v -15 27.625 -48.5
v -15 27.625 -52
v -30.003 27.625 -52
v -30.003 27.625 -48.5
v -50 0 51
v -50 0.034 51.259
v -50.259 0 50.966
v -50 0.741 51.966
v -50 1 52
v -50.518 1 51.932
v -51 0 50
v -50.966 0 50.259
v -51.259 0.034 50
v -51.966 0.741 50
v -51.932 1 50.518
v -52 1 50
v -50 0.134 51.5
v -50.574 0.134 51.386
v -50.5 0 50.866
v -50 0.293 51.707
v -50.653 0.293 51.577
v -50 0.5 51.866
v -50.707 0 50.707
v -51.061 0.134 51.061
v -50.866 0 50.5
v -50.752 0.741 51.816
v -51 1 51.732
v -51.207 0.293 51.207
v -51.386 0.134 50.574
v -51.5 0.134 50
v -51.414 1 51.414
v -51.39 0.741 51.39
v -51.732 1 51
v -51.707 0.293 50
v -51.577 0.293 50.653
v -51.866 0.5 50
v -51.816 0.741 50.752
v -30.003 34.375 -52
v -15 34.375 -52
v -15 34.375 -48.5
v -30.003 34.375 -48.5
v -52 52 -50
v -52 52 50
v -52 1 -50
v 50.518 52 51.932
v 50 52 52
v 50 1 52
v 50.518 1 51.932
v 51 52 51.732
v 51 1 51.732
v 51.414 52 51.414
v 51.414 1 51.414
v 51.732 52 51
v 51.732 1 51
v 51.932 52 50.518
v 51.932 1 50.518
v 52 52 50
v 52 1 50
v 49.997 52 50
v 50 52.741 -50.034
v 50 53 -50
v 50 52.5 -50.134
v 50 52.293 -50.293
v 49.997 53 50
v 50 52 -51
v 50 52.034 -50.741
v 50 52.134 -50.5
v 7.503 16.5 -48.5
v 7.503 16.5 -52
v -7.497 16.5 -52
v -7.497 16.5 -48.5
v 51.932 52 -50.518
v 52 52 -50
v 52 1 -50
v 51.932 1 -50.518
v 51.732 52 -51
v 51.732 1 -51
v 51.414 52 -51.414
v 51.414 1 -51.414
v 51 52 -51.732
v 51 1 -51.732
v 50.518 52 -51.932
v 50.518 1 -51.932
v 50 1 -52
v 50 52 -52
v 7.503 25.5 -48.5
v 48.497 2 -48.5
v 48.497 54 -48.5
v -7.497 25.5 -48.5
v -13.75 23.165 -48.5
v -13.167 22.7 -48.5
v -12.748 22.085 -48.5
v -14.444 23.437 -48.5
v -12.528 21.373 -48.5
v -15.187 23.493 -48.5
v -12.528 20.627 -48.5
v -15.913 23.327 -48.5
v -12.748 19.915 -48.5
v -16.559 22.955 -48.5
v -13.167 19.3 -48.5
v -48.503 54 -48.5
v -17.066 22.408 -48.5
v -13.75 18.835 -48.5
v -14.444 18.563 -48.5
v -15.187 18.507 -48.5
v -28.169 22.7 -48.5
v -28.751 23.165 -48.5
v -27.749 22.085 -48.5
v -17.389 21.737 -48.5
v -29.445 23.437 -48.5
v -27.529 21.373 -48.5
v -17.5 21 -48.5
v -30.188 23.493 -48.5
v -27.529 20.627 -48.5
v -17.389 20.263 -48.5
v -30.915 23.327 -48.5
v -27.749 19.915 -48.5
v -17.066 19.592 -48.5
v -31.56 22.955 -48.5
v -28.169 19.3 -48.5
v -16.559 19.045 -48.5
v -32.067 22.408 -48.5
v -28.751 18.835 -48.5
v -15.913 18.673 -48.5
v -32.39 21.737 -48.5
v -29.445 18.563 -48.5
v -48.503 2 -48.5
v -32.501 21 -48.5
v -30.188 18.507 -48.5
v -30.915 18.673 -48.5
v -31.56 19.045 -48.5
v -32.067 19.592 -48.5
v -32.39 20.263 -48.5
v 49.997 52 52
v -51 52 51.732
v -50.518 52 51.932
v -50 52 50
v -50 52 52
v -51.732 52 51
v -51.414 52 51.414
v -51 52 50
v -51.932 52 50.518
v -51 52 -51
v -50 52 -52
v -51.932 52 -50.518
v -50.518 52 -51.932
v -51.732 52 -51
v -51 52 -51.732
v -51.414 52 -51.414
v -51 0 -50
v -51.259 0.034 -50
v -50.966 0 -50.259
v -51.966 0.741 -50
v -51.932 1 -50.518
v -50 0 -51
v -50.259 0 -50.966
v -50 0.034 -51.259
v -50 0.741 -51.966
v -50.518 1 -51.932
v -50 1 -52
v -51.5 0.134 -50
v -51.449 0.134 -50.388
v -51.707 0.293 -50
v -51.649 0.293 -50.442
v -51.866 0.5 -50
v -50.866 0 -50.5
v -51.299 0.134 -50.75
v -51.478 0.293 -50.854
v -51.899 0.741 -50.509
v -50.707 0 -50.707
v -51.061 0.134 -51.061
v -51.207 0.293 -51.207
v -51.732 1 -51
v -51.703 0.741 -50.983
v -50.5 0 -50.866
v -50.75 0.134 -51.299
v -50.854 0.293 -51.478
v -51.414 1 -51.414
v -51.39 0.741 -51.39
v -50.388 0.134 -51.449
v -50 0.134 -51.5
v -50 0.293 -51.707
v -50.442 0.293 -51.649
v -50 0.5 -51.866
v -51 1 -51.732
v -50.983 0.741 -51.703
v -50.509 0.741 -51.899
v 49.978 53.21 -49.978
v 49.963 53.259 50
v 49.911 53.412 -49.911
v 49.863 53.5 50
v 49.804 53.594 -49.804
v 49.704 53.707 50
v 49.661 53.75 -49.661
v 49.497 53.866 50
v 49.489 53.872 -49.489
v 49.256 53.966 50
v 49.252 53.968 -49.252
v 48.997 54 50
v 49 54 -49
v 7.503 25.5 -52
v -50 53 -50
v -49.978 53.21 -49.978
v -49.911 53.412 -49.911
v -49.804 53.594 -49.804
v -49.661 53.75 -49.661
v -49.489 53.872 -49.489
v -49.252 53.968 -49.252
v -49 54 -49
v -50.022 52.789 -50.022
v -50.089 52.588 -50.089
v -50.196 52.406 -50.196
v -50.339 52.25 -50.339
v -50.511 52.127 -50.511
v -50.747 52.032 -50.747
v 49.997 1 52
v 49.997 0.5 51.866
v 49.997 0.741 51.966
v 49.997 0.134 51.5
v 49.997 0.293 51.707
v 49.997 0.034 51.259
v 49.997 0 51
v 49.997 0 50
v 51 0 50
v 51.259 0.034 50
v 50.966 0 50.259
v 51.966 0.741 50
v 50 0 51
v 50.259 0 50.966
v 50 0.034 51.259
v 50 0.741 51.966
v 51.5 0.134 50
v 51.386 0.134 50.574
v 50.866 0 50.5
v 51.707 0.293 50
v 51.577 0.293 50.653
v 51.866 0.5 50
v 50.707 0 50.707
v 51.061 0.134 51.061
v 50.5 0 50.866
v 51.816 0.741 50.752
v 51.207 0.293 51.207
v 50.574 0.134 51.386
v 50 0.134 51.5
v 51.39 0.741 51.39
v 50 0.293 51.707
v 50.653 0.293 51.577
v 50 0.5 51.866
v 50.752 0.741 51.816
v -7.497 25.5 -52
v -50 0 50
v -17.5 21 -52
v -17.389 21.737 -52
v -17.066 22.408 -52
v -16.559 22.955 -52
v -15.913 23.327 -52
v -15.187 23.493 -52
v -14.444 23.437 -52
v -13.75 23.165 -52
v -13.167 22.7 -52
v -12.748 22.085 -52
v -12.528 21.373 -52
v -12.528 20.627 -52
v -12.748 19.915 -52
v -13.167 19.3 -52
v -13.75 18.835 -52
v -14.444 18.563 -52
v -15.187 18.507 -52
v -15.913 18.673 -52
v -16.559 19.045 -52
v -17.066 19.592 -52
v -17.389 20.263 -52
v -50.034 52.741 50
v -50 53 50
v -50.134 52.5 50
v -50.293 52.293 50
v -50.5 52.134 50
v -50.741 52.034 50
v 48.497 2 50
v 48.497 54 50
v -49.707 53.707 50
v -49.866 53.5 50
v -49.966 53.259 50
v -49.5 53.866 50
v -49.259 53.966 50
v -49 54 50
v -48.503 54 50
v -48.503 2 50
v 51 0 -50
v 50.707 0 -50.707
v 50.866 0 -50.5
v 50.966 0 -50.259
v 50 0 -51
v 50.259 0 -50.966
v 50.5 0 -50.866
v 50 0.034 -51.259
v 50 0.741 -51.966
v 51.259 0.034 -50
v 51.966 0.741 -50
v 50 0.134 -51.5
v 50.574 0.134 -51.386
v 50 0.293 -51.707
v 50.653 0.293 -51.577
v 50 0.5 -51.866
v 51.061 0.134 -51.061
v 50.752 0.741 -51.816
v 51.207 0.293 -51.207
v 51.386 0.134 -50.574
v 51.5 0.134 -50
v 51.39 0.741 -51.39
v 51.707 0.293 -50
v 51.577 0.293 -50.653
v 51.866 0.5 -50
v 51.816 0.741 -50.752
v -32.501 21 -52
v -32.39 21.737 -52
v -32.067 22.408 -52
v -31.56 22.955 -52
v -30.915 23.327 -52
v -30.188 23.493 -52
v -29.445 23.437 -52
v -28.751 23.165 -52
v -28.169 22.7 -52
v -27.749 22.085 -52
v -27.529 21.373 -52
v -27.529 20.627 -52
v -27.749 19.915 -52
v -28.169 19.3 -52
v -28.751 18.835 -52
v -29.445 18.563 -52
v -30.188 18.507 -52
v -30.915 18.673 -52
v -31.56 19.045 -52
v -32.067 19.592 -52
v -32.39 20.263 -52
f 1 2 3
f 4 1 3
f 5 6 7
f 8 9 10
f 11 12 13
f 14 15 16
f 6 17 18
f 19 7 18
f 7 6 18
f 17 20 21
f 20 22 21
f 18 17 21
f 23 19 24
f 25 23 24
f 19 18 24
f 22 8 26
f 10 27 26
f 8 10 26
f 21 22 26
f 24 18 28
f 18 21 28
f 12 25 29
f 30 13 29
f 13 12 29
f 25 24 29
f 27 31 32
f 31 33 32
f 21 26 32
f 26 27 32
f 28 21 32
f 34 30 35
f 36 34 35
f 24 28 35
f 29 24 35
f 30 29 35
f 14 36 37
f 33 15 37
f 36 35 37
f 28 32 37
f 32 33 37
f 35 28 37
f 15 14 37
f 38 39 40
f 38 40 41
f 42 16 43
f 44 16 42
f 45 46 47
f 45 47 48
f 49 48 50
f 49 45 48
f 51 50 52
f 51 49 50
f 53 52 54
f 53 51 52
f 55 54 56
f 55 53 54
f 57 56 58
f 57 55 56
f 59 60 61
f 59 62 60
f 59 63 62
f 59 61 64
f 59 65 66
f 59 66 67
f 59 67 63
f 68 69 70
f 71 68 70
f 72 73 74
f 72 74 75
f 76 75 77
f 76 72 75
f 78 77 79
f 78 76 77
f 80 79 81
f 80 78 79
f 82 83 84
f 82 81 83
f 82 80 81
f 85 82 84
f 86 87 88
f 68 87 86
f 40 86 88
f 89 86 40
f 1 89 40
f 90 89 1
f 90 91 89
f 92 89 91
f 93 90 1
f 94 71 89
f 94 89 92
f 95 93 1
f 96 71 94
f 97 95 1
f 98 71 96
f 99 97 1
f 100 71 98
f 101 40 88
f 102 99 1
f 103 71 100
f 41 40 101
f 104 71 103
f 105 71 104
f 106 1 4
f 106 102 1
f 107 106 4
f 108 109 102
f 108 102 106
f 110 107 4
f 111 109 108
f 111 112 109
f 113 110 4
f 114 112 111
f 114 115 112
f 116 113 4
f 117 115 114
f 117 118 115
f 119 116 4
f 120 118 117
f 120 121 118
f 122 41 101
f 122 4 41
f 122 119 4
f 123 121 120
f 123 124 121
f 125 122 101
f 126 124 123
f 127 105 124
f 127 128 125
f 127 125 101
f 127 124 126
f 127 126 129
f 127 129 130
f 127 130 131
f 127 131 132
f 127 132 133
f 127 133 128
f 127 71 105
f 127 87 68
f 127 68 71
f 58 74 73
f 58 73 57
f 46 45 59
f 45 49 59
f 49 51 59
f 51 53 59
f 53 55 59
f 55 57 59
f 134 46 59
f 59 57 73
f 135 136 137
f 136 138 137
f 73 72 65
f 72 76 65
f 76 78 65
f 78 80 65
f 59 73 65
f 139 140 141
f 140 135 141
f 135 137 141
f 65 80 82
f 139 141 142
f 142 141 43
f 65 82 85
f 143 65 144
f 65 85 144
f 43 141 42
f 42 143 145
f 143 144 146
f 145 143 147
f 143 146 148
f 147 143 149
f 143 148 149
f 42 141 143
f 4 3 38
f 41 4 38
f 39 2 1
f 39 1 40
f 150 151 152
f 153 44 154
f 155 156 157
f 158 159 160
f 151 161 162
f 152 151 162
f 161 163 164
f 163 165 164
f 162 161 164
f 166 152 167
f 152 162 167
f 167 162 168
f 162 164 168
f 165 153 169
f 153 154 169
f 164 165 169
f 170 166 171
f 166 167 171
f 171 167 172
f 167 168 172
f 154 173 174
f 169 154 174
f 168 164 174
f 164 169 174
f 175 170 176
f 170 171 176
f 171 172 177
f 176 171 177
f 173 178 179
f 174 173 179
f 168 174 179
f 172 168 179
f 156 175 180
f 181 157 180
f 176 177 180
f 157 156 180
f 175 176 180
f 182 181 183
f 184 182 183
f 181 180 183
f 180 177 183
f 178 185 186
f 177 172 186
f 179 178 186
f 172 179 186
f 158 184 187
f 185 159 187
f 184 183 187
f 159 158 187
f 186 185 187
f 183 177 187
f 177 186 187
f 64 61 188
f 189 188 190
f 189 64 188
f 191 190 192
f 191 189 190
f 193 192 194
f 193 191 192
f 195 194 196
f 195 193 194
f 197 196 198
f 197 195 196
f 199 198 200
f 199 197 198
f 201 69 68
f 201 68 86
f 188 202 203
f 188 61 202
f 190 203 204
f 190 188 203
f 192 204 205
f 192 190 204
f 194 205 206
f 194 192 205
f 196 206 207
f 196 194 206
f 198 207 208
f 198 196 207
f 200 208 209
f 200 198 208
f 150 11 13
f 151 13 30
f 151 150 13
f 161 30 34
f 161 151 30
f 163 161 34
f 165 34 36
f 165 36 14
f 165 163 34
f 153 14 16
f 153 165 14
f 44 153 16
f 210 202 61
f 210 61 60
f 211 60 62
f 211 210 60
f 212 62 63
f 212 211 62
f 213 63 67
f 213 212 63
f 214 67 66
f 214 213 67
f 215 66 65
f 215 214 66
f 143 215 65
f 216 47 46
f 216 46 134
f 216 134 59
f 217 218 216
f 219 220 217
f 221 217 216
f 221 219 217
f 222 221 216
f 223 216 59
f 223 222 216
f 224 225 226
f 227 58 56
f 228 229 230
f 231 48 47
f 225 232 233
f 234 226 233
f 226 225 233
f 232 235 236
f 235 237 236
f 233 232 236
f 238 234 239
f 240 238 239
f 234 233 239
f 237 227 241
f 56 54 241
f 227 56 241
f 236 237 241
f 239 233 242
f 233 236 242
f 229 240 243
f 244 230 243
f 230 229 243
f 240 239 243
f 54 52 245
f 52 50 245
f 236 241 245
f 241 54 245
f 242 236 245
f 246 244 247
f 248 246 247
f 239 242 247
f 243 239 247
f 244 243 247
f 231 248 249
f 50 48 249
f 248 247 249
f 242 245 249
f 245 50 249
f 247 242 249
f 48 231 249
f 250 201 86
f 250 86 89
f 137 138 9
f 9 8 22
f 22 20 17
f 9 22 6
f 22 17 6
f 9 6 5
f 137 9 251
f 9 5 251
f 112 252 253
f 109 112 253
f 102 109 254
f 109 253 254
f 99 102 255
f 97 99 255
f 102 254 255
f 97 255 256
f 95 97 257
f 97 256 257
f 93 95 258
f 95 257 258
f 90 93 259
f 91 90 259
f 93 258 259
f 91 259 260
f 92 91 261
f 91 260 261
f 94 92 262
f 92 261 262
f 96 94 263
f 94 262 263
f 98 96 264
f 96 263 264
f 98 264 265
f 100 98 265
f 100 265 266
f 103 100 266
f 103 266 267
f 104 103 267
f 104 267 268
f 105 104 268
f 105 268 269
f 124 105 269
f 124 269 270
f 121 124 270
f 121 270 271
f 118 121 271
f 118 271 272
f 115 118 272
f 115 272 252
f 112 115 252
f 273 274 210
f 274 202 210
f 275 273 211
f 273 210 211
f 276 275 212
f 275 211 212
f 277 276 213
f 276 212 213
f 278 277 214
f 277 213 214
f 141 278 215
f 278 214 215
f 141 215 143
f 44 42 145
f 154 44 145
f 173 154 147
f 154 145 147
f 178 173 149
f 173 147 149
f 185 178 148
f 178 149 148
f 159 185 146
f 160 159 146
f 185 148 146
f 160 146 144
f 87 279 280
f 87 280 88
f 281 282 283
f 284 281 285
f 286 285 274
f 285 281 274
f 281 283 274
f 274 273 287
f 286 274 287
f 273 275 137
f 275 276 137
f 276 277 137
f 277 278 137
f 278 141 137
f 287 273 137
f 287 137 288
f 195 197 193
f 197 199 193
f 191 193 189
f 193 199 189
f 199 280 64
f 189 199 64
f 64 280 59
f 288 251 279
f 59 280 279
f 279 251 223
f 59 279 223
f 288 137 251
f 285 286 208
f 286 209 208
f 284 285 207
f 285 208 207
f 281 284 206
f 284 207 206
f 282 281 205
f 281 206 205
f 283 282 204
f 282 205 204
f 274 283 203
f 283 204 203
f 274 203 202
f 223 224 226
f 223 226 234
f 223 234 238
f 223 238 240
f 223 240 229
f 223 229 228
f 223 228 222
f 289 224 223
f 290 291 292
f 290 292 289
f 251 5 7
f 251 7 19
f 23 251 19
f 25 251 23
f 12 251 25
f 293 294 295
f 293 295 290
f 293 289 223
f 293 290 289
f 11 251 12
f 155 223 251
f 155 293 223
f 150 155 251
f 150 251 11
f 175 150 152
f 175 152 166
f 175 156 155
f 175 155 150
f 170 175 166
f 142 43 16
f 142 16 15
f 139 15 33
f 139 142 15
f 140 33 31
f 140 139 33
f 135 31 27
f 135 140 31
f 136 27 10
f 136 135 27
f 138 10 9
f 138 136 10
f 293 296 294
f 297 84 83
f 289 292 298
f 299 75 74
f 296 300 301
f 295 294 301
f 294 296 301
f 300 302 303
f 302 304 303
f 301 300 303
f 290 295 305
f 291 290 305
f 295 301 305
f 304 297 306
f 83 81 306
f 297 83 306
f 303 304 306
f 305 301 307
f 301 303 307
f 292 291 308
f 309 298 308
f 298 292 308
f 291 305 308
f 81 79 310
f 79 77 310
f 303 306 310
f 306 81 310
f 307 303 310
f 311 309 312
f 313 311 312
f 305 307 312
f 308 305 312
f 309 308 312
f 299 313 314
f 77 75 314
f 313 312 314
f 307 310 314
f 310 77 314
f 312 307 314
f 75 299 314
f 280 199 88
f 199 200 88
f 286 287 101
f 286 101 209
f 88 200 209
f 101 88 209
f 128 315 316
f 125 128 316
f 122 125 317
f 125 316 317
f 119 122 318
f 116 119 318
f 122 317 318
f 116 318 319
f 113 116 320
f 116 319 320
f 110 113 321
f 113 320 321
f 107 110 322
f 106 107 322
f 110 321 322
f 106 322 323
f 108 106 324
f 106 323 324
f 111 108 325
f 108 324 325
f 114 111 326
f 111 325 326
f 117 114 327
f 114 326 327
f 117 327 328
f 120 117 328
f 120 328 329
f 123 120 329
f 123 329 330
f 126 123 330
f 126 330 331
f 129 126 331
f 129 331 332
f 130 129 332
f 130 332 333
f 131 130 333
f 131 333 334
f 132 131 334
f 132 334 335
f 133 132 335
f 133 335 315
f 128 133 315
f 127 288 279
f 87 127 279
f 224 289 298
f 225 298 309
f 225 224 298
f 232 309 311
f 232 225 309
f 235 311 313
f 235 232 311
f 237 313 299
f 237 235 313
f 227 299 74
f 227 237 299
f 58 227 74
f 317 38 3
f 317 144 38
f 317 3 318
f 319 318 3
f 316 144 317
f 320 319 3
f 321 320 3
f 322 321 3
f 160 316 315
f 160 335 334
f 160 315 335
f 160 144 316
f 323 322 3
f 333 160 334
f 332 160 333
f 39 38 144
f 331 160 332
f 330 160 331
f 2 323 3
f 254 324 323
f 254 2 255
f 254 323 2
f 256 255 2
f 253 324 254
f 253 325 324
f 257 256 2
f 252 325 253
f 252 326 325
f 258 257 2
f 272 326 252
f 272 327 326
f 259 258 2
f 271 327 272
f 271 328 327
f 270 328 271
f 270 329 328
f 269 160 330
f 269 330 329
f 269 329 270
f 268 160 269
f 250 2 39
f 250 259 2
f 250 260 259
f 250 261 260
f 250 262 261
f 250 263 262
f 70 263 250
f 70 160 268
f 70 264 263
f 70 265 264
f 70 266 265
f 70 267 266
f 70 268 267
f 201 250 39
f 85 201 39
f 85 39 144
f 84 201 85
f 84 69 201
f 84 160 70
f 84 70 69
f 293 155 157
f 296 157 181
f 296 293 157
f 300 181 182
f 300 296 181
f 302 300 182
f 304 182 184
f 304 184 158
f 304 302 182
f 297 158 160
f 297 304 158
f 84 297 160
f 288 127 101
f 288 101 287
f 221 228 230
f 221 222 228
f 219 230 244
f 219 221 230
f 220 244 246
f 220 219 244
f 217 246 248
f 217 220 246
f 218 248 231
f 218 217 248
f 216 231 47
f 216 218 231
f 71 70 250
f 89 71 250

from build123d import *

# Parameters (mm, degrees)
SCHIZZO1_W                   = 100
SCHIZZO1_H                   = 100
ESTRUSIONE_ESTRUSIONE1_DEPTH = 2
ESTRUSIONE_ESTRUSIONE2_DEPTH = 52
ESTRUSIONE_ESTRUSIONE3_DEPTH = 54
RACCORDO1_R                  = 1
RACCORDO2_R                  = 1
RACCORDO3_R                  = 2
RACCORDO4_R                  = 2
RACCORDO5_R                  = 1
SCHIZZO4_R                   = 2.5
SCHIZZO4_W                   = 15.002685422
SCHIZZO4_H                   = 6.74925895
SCHIZZO4_W_2                 = 15
SCHIZZO4_H_2                 = 9
TAGLIO_ESTRUSIONE1_DEPTH     = 10


with BuildPart() as part:
    # Schizzo1 → Estrusione-Estrusione1 (new body)
    with BuildSketch(Plane(origin=(0, 0, 0), x_dir=(1, 0, 0), z_dir=(0, 1, 0))):
        Rectangle(SCHIZZO1_W, SCHIZZO1_H)
    extrude(amount=ESTRUSIONE_ESTRUSIONE1_DEPTH)

    # Schizzo2 → Estrusione-Estrusione2 (add)
    with BuildSketch(Plane(origin=(0, 0, 0), x_dir=(1, 0, 0), z_dir=(0, 1, 0))):
        Polygon((-50, -50), (-50, -52), (-52, -52), (-52, 52), (52, 52), (52, -52), (49.997213979, -52), (49.997213979, -50), (50, 50), (-50, 50), align=None)
    extrude(amount=ESTRUSIONE_ESTRUSIONE2_DEPTH)

    # Schizzo3 → Estrusione-Estrusione3 (add)
    with BuildSketch(Plane(origin=(0, 0, 0), x_dir=(1, 0, 0), z_dir=(0, 1, 0))):
        Polygon((-50, -50), (-50, 50), (50, 50), (49.997213979, -50), (48.497213979, -50), (48.497213979, 48.5), (-48.502786021, 48.5), (-48.502786021, -50), align=None)
    extrude(amount=ESTRUSIONE_ESTRUSIONE3_DEPTH)

    # Raccordo1
    raccordo1_edges = [part.edges().sort_by_distance(p)[0] for p in [
        (49.998606989, 54, 0),
        (0, 54, -50),
        (-50, 54, 0),
    ]]
    fillet(raccordo1_edges, radius=RACCORDO1_R)

    # Raccordo2
    raccordo2_edges = [part.edges().sort_by_distance(p)[0] for p in [
        (-50, 52, 0),
        (0, 52, -50),
    ]]
    fillet(raccordo2_edges, radius=RACCORDO2_R - 0.0001)  # a hair under: the kernel refuses the full size

    # Raccordo3
    raccordo3_edges = [part.edges().sort_by_distance(p)[0] for p in [
        (52, 26, 52),
        (52, 26, -52),
        (-52, 26, 52),
    ]]
    fillet(raccordo3_edges, radius=RACCORDO3_R - 0.0001)  # a hair under: the kernel refuses the full size

    # Raccordo4
    raccordo4_edges = [part.edges().sort_by_distance(p)[0] for p in [
        (-52, 26, -52),
    ]]
    fillet(raccordo4_edges, radius=RACCORDO4_R)

    # Raccordo5
    raccordo5_edges = [part.edges().sort_by_distance(p)[0] for p in [
        (5e-05, 0, -52),
        (52, 0, 0),
        (-51.414242852, 0, 51.414242852),
        (51.414242852, 0, 51.414242852),
        (51.414242852, 0, -51.414242852),
        (-52, 0, 5e-05),
        (-51.414213562, 0, -51.414213562),
        (49.998656989, 0, 52),
    ]]
    fillet(raccordo5_edges, radius=RACCORDO5_R)

    # Schizzo4 → Taglio-Estrusione1 (cut)
    with BuildSketch(Plane(origin=(0, 0, -52), x_dir=(-1, 0, 0), z_dir=(0, 0, -1))):
        with Locations((15, 21)):
            Circle(SCHIZZO4_R)
        with Locations((30.001342711, 21)):
            Circle(SCHIZZO4_R)
        with Locations((22.501342711, 31)):
            Rectangle(SCHIZZO4_W, SCHIZZO4_H)
        with Locations((-0.00336937, 21)):
            Rectangle(SCHIZZO4_W_2, SCHIZZO4_H_2)
    extrude(amount=-TAGLIO_ESTRUSIONE1_DEPTH, mode=Mode.SUBTRACT)


solid = part.part
